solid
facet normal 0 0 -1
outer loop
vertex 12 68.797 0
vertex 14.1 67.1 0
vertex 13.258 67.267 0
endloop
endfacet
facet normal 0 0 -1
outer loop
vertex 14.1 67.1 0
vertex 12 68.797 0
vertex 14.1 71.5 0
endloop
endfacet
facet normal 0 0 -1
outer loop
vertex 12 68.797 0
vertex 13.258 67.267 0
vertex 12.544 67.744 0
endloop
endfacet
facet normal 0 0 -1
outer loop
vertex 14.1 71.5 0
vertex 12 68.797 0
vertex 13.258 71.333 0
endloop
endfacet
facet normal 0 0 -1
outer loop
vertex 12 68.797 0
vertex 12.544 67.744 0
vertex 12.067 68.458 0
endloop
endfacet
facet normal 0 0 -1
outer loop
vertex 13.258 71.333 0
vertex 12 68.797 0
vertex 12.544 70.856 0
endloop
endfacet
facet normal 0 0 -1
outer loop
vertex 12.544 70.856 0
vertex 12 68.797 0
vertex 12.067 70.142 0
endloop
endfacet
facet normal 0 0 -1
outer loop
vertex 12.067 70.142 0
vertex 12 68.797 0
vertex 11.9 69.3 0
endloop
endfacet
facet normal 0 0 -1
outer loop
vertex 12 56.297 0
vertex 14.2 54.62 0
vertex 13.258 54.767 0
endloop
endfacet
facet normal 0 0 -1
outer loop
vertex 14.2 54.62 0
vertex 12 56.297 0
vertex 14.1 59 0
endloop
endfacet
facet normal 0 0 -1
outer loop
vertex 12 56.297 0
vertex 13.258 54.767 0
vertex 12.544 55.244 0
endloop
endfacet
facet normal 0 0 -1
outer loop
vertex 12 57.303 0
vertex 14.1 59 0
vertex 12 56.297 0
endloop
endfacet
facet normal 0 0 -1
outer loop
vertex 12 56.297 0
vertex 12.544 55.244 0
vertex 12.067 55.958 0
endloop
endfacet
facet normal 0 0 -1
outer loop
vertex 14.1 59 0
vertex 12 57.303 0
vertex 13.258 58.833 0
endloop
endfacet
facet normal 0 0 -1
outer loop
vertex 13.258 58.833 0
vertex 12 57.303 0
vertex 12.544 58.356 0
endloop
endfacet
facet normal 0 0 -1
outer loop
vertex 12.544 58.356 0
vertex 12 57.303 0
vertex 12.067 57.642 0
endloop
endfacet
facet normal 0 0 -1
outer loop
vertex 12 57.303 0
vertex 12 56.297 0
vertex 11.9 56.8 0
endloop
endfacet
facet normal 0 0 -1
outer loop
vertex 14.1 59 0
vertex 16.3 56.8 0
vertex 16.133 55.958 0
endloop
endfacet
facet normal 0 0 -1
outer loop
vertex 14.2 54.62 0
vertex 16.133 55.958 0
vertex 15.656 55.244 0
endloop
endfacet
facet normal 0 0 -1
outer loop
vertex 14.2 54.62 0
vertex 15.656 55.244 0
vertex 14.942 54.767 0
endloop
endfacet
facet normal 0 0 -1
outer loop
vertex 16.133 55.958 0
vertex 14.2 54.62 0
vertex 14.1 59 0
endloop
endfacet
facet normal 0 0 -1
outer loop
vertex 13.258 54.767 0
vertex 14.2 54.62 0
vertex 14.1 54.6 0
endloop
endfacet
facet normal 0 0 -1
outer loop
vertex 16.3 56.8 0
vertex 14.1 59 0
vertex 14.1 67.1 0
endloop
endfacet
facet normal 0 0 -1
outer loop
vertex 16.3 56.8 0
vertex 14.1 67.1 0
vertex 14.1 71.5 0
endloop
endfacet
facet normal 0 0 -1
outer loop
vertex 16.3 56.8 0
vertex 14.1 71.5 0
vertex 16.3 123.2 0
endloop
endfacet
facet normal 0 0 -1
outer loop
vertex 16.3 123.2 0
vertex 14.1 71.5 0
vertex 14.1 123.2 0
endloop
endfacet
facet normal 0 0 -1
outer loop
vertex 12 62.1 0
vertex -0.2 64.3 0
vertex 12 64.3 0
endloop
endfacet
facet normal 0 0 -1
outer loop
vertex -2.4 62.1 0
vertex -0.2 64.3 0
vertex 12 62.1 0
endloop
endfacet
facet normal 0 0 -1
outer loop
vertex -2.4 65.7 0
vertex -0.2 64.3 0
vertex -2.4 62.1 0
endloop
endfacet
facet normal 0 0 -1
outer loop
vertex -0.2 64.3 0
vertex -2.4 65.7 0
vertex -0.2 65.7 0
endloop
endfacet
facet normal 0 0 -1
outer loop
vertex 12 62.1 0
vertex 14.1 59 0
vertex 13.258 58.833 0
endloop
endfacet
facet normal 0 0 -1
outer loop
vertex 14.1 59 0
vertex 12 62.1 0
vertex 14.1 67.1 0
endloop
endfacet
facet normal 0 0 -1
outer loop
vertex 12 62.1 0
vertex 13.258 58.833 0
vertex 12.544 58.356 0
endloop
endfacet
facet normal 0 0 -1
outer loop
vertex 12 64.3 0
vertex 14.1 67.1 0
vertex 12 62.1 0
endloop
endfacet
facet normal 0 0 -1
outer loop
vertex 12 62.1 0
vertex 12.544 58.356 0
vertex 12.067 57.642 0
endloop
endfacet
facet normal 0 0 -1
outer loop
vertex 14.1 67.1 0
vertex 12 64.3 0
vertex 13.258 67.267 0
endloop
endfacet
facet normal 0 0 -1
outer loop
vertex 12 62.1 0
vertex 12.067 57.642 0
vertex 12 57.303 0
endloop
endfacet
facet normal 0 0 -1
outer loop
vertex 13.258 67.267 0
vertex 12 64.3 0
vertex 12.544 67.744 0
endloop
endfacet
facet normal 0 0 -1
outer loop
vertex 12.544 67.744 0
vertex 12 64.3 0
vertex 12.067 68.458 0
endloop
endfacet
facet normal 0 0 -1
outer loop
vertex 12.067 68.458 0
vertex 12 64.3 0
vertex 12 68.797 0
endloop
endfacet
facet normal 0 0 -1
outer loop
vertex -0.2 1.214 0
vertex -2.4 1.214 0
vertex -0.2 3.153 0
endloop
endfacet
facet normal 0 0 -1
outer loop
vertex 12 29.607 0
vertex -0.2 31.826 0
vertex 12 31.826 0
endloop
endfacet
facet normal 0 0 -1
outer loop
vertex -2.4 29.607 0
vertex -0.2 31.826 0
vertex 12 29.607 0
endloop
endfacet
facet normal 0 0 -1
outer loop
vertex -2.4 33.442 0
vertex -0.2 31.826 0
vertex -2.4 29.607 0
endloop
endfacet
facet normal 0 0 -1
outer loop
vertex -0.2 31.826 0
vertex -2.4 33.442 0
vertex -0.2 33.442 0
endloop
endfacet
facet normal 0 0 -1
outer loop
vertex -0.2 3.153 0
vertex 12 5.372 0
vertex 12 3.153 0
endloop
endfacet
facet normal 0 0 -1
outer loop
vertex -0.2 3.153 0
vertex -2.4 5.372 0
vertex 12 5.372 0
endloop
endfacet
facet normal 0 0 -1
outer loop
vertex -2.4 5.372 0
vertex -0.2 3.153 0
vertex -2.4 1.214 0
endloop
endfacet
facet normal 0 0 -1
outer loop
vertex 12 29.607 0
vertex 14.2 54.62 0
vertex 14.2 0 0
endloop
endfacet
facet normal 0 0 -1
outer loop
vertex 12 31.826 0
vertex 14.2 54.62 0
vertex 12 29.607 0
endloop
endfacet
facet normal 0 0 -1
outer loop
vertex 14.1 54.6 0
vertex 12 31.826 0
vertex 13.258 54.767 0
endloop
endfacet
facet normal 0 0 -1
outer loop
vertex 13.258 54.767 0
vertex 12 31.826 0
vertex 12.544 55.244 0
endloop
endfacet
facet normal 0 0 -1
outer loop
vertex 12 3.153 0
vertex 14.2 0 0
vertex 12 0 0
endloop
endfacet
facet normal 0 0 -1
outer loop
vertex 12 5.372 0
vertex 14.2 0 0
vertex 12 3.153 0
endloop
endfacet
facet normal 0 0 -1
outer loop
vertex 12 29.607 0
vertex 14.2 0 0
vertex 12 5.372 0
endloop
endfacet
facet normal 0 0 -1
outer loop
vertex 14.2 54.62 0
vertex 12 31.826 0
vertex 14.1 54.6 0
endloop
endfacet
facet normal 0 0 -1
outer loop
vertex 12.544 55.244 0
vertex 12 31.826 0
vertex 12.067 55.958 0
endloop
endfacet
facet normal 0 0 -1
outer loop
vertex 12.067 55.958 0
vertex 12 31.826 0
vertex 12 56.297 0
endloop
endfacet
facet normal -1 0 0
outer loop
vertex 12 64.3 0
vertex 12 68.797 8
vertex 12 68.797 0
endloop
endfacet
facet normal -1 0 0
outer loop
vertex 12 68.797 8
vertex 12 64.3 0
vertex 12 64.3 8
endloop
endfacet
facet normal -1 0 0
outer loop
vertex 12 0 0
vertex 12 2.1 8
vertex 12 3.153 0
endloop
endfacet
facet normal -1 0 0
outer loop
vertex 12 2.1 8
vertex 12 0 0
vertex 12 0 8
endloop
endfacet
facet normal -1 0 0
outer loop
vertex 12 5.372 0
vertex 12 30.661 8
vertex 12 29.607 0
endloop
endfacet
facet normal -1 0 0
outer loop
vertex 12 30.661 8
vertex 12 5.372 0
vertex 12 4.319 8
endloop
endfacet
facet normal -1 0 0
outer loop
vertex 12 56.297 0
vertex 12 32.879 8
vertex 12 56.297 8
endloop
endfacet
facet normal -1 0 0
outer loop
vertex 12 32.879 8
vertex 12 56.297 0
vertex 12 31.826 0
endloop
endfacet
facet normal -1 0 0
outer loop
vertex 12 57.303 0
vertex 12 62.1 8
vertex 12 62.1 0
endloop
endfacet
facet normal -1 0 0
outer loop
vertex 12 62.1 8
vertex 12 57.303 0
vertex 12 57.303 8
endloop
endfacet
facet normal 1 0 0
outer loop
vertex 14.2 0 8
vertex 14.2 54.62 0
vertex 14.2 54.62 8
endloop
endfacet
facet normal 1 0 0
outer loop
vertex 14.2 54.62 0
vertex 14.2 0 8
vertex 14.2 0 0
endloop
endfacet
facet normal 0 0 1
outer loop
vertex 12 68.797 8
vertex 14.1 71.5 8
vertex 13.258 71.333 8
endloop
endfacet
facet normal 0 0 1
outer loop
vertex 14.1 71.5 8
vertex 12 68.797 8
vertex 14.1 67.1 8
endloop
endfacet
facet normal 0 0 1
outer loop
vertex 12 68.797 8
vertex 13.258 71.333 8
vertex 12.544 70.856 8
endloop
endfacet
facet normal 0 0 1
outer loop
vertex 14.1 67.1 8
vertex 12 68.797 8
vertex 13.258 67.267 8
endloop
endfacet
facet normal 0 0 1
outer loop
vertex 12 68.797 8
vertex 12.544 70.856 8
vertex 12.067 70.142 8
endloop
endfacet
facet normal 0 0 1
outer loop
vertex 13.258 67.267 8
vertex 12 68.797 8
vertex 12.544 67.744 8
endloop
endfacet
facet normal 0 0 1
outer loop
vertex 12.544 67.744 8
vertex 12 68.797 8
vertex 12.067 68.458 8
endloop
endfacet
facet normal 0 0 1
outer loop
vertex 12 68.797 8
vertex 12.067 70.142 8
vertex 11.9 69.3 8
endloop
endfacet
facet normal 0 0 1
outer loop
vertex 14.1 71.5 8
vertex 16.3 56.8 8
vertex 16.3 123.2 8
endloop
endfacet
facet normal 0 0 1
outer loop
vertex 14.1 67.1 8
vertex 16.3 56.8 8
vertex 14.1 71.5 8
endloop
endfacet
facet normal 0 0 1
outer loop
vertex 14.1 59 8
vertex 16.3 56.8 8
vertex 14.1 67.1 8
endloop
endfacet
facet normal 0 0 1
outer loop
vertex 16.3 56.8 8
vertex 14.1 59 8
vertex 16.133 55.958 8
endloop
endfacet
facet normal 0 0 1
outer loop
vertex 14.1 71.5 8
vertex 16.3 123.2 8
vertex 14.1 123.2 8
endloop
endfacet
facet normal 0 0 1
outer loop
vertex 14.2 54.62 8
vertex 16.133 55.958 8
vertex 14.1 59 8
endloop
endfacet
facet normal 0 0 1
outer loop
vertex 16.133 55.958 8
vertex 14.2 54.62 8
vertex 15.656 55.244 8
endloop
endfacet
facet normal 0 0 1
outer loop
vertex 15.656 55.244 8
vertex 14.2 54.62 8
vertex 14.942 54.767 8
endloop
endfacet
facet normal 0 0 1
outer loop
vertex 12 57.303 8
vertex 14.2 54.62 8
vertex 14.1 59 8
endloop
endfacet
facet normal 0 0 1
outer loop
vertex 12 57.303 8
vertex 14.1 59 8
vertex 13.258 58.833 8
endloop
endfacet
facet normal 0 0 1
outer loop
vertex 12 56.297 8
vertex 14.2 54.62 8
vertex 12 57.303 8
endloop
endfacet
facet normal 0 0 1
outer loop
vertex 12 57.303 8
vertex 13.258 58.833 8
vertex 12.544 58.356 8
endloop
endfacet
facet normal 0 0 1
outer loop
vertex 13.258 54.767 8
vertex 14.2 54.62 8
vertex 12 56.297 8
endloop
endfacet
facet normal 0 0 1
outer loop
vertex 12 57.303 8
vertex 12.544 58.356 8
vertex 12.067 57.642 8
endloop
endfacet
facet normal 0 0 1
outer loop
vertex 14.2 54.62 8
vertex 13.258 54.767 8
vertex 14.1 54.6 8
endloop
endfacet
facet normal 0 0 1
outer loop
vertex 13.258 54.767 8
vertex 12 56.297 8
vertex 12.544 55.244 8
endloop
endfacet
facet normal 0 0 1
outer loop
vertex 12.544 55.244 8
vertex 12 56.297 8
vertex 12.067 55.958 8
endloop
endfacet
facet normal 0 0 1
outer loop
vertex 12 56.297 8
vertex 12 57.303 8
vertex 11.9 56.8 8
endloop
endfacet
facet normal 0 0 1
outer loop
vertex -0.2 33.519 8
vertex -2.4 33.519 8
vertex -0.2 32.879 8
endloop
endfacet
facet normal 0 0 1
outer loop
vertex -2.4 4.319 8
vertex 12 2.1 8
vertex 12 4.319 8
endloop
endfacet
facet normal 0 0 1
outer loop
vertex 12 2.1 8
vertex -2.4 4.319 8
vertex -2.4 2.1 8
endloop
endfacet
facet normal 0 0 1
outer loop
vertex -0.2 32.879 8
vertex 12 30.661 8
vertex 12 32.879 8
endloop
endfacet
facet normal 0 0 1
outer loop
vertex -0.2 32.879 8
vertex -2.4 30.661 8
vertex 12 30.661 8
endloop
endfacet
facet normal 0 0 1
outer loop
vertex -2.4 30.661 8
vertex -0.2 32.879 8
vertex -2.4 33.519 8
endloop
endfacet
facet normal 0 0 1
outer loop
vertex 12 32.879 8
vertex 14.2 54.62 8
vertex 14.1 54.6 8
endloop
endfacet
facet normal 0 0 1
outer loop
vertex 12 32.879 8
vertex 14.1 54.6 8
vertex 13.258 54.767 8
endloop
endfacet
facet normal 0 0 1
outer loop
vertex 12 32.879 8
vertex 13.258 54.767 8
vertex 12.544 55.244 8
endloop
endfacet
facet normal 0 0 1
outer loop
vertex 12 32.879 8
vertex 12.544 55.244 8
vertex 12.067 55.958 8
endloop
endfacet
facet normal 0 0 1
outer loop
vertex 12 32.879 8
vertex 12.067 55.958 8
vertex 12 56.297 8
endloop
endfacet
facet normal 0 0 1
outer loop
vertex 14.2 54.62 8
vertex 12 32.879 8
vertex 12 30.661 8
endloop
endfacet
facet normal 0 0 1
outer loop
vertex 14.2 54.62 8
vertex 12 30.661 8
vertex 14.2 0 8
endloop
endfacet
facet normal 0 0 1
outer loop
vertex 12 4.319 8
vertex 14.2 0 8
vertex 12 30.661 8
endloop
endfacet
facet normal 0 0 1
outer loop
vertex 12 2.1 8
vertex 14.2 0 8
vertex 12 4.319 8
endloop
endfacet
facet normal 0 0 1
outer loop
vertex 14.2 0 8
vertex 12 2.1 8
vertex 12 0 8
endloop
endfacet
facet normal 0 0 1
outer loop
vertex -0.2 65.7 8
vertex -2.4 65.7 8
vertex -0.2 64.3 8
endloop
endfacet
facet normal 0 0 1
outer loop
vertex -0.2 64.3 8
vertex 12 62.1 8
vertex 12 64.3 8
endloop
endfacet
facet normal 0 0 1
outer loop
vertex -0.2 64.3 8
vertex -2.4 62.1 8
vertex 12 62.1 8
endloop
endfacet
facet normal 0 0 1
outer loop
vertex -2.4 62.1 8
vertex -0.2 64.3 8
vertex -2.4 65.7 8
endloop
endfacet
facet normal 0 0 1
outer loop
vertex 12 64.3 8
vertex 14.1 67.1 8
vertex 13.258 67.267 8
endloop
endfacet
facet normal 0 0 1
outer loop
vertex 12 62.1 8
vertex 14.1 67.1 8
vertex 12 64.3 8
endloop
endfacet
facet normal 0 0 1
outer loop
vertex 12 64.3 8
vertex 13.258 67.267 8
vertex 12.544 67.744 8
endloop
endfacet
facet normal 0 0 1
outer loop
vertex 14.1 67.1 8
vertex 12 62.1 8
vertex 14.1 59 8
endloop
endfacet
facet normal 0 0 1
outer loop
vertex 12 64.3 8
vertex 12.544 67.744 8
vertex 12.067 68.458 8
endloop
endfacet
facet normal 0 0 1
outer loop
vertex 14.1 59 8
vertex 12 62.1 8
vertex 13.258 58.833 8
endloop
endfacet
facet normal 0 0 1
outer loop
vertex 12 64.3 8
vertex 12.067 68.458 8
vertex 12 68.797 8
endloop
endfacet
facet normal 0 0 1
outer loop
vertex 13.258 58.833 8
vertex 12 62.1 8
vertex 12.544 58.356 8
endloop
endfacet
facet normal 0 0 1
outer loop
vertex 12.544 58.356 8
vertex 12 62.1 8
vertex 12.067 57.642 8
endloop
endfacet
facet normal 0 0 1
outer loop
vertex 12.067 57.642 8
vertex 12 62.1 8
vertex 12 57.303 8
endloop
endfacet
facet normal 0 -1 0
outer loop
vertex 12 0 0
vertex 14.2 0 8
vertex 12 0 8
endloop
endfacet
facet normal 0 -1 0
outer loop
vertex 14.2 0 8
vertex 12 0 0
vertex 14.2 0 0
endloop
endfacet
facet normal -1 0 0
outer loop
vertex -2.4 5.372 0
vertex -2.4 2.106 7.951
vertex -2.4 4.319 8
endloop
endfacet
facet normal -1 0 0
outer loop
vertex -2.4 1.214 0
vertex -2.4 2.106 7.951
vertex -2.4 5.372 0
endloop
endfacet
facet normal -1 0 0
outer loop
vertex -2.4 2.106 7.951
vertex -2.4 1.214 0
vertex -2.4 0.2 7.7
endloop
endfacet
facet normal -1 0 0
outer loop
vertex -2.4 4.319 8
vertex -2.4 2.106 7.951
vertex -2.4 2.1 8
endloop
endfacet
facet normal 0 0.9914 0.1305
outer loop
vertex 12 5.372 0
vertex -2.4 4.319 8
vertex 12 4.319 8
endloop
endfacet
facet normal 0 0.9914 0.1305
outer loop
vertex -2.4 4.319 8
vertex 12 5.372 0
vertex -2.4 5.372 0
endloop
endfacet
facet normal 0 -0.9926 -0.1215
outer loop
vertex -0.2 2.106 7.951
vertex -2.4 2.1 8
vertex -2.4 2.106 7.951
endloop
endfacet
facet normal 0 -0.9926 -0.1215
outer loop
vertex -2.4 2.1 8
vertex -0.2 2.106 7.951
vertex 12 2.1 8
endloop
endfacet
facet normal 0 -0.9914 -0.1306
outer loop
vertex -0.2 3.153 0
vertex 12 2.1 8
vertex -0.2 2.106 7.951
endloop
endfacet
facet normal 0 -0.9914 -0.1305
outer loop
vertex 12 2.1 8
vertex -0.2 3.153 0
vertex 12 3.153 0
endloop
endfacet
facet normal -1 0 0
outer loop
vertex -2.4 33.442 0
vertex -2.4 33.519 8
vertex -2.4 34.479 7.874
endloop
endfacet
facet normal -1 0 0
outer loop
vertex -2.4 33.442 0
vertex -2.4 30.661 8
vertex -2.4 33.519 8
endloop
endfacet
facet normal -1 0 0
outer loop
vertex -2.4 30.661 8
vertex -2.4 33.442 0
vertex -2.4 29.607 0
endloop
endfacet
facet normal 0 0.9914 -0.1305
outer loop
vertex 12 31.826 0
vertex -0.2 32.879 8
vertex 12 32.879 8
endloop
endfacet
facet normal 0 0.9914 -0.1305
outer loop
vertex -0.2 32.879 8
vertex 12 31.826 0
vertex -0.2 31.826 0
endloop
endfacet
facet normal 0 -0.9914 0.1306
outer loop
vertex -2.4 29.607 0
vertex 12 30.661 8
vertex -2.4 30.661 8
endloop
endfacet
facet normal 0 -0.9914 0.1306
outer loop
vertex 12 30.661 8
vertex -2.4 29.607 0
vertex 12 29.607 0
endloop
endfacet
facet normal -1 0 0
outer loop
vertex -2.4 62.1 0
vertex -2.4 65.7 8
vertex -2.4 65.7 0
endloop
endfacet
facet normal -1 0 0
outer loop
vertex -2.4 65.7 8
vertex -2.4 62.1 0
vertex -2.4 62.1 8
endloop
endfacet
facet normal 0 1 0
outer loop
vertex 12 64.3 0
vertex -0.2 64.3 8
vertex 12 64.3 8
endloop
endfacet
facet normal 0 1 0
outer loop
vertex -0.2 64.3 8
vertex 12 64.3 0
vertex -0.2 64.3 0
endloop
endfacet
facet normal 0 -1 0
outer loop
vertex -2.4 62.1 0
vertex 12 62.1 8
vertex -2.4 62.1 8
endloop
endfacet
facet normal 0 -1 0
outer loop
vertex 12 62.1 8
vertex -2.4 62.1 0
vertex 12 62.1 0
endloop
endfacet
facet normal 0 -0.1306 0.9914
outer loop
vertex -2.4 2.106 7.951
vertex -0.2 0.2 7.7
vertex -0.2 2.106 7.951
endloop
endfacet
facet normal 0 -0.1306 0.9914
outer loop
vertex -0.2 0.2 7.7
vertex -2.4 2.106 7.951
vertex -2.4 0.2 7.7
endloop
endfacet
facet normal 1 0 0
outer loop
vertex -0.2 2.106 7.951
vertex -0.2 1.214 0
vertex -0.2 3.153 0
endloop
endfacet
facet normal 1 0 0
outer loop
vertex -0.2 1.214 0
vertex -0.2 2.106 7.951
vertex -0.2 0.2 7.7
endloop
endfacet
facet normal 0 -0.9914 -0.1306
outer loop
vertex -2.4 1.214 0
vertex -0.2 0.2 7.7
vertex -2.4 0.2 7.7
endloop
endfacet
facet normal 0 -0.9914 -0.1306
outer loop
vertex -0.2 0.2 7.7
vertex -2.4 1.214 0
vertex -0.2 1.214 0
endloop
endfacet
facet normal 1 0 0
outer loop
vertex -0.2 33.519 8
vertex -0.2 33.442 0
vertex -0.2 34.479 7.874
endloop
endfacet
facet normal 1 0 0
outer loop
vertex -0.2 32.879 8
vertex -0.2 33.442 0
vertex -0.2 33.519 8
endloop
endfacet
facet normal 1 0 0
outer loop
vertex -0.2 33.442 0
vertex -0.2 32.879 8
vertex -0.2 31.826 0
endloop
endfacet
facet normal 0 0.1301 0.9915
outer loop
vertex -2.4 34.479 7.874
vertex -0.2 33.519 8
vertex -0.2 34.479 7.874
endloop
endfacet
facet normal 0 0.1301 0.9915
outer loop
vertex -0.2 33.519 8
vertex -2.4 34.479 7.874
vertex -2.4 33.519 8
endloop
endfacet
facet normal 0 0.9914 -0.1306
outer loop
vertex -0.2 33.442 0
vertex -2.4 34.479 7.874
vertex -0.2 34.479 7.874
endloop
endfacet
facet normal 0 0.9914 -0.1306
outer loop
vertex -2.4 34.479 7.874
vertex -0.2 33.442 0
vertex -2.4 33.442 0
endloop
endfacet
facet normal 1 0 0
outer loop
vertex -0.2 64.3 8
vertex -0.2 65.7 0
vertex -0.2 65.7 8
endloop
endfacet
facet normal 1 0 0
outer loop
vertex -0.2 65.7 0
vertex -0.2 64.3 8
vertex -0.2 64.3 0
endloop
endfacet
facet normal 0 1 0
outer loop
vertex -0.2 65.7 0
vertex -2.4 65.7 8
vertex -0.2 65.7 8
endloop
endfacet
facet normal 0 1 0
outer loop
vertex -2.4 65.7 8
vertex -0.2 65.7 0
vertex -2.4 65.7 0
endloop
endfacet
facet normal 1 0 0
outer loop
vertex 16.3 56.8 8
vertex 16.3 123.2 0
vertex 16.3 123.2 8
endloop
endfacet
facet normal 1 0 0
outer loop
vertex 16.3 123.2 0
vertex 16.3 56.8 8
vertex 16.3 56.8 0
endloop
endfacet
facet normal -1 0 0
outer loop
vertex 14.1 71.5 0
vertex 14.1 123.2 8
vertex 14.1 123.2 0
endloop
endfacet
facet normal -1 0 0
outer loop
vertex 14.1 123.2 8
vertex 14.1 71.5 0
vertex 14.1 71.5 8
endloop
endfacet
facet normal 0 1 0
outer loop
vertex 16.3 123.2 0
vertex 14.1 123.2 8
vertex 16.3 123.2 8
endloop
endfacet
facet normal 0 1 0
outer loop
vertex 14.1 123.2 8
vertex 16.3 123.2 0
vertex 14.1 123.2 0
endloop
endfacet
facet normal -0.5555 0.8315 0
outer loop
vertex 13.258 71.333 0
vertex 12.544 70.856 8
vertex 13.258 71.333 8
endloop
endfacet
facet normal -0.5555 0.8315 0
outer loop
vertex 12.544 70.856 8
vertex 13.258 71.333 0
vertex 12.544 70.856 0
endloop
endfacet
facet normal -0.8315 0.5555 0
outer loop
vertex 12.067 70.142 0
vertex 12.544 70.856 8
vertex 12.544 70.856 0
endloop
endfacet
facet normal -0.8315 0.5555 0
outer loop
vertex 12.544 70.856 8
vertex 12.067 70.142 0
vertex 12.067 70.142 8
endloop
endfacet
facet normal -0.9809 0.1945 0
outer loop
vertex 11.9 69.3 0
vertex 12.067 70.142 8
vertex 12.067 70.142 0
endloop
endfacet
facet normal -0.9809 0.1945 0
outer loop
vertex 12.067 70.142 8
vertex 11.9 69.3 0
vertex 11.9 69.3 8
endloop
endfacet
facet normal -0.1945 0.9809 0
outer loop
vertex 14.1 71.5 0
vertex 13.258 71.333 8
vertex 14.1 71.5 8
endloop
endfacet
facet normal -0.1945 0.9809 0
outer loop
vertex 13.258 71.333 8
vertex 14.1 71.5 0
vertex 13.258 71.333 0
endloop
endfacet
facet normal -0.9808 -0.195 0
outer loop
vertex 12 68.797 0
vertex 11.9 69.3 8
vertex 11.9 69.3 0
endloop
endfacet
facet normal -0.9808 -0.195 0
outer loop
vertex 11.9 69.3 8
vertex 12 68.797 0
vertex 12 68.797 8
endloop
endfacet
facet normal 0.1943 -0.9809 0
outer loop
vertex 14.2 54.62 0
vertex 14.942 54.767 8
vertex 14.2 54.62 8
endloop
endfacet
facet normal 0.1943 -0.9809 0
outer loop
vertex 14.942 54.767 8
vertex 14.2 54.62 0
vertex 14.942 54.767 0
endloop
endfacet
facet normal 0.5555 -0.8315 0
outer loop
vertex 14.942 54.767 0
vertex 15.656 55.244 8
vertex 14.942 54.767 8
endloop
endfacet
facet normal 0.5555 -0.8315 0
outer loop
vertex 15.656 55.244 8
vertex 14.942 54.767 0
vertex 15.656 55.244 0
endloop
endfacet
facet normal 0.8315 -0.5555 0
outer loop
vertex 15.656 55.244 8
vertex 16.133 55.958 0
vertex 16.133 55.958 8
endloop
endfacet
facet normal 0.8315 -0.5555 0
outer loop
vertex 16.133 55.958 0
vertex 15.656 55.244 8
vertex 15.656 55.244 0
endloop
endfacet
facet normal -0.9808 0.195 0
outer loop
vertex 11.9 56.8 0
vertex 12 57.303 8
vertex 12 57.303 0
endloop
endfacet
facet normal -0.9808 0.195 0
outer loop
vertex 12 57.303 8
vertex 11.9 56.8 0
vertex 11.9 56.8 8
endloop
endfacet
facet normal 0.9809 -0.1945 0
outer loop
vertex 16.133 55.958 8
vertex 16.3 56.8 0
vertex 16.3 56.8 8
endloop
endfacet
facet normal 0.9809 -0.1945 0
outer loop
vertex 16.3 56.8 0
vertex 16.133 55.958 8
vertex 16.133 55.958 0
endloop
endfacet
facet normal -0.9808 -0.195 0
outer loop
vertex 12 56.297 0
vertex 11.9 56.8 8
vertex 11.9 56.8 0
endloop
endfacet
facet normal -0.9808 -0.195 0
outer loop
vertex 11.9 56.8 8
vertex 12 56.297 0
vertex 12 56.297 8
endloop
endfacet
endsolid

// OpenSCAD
/*
import("prusa_Y-Carriage_v2_middle_final_fixed.stl");
*/
union(){
translate([14.1,64.3-2.5-5,0])
cube([2.2,123.2-64.3+2.5+5,8]);

translate([14.1,64.3+5,0])
cylinder(8,2.2,2.2,$fn=16);

translate([14.1,64.3-2.5-5,0])
cylinder(8,2.2,2.2,$fn=16);

translate([0,-41,67])
rotate([0,90,0])
translate([0,0,12])
mirror([0,0,1]){
difference(){
difference(){
union(){
translate([59,41,-2.2])
cube([8,64.3+5,2.2]);																															translate([59,43.1,-0.1])							
rotate([0,0,7.5])
cube([8.5,2.2,14.5]);


translate([58.7,71.7,-0.1])							
rotate([0,0,-7.5])
cube([8.5,2.2,14.5]);

translate([59,103.1,-0.1])							
cube([8.5,2.2,14.5]);

translate([59.3,41.2,12.2])
rotate([0,0,7.5])
cube([8.5,2.5,2.2]);

translate([58.8,73,12.2])
rotate([0,0,-7.5])
cube([8.5,2.5,2.2]);

translate([59,104.2,12.2])
cube([8.5,2.5,2.2]);
}
translate([49,40,-4])
cube([10,140,20]);
}

translate([67,40,-4])
cube([10,140,20]);
}
}
}
